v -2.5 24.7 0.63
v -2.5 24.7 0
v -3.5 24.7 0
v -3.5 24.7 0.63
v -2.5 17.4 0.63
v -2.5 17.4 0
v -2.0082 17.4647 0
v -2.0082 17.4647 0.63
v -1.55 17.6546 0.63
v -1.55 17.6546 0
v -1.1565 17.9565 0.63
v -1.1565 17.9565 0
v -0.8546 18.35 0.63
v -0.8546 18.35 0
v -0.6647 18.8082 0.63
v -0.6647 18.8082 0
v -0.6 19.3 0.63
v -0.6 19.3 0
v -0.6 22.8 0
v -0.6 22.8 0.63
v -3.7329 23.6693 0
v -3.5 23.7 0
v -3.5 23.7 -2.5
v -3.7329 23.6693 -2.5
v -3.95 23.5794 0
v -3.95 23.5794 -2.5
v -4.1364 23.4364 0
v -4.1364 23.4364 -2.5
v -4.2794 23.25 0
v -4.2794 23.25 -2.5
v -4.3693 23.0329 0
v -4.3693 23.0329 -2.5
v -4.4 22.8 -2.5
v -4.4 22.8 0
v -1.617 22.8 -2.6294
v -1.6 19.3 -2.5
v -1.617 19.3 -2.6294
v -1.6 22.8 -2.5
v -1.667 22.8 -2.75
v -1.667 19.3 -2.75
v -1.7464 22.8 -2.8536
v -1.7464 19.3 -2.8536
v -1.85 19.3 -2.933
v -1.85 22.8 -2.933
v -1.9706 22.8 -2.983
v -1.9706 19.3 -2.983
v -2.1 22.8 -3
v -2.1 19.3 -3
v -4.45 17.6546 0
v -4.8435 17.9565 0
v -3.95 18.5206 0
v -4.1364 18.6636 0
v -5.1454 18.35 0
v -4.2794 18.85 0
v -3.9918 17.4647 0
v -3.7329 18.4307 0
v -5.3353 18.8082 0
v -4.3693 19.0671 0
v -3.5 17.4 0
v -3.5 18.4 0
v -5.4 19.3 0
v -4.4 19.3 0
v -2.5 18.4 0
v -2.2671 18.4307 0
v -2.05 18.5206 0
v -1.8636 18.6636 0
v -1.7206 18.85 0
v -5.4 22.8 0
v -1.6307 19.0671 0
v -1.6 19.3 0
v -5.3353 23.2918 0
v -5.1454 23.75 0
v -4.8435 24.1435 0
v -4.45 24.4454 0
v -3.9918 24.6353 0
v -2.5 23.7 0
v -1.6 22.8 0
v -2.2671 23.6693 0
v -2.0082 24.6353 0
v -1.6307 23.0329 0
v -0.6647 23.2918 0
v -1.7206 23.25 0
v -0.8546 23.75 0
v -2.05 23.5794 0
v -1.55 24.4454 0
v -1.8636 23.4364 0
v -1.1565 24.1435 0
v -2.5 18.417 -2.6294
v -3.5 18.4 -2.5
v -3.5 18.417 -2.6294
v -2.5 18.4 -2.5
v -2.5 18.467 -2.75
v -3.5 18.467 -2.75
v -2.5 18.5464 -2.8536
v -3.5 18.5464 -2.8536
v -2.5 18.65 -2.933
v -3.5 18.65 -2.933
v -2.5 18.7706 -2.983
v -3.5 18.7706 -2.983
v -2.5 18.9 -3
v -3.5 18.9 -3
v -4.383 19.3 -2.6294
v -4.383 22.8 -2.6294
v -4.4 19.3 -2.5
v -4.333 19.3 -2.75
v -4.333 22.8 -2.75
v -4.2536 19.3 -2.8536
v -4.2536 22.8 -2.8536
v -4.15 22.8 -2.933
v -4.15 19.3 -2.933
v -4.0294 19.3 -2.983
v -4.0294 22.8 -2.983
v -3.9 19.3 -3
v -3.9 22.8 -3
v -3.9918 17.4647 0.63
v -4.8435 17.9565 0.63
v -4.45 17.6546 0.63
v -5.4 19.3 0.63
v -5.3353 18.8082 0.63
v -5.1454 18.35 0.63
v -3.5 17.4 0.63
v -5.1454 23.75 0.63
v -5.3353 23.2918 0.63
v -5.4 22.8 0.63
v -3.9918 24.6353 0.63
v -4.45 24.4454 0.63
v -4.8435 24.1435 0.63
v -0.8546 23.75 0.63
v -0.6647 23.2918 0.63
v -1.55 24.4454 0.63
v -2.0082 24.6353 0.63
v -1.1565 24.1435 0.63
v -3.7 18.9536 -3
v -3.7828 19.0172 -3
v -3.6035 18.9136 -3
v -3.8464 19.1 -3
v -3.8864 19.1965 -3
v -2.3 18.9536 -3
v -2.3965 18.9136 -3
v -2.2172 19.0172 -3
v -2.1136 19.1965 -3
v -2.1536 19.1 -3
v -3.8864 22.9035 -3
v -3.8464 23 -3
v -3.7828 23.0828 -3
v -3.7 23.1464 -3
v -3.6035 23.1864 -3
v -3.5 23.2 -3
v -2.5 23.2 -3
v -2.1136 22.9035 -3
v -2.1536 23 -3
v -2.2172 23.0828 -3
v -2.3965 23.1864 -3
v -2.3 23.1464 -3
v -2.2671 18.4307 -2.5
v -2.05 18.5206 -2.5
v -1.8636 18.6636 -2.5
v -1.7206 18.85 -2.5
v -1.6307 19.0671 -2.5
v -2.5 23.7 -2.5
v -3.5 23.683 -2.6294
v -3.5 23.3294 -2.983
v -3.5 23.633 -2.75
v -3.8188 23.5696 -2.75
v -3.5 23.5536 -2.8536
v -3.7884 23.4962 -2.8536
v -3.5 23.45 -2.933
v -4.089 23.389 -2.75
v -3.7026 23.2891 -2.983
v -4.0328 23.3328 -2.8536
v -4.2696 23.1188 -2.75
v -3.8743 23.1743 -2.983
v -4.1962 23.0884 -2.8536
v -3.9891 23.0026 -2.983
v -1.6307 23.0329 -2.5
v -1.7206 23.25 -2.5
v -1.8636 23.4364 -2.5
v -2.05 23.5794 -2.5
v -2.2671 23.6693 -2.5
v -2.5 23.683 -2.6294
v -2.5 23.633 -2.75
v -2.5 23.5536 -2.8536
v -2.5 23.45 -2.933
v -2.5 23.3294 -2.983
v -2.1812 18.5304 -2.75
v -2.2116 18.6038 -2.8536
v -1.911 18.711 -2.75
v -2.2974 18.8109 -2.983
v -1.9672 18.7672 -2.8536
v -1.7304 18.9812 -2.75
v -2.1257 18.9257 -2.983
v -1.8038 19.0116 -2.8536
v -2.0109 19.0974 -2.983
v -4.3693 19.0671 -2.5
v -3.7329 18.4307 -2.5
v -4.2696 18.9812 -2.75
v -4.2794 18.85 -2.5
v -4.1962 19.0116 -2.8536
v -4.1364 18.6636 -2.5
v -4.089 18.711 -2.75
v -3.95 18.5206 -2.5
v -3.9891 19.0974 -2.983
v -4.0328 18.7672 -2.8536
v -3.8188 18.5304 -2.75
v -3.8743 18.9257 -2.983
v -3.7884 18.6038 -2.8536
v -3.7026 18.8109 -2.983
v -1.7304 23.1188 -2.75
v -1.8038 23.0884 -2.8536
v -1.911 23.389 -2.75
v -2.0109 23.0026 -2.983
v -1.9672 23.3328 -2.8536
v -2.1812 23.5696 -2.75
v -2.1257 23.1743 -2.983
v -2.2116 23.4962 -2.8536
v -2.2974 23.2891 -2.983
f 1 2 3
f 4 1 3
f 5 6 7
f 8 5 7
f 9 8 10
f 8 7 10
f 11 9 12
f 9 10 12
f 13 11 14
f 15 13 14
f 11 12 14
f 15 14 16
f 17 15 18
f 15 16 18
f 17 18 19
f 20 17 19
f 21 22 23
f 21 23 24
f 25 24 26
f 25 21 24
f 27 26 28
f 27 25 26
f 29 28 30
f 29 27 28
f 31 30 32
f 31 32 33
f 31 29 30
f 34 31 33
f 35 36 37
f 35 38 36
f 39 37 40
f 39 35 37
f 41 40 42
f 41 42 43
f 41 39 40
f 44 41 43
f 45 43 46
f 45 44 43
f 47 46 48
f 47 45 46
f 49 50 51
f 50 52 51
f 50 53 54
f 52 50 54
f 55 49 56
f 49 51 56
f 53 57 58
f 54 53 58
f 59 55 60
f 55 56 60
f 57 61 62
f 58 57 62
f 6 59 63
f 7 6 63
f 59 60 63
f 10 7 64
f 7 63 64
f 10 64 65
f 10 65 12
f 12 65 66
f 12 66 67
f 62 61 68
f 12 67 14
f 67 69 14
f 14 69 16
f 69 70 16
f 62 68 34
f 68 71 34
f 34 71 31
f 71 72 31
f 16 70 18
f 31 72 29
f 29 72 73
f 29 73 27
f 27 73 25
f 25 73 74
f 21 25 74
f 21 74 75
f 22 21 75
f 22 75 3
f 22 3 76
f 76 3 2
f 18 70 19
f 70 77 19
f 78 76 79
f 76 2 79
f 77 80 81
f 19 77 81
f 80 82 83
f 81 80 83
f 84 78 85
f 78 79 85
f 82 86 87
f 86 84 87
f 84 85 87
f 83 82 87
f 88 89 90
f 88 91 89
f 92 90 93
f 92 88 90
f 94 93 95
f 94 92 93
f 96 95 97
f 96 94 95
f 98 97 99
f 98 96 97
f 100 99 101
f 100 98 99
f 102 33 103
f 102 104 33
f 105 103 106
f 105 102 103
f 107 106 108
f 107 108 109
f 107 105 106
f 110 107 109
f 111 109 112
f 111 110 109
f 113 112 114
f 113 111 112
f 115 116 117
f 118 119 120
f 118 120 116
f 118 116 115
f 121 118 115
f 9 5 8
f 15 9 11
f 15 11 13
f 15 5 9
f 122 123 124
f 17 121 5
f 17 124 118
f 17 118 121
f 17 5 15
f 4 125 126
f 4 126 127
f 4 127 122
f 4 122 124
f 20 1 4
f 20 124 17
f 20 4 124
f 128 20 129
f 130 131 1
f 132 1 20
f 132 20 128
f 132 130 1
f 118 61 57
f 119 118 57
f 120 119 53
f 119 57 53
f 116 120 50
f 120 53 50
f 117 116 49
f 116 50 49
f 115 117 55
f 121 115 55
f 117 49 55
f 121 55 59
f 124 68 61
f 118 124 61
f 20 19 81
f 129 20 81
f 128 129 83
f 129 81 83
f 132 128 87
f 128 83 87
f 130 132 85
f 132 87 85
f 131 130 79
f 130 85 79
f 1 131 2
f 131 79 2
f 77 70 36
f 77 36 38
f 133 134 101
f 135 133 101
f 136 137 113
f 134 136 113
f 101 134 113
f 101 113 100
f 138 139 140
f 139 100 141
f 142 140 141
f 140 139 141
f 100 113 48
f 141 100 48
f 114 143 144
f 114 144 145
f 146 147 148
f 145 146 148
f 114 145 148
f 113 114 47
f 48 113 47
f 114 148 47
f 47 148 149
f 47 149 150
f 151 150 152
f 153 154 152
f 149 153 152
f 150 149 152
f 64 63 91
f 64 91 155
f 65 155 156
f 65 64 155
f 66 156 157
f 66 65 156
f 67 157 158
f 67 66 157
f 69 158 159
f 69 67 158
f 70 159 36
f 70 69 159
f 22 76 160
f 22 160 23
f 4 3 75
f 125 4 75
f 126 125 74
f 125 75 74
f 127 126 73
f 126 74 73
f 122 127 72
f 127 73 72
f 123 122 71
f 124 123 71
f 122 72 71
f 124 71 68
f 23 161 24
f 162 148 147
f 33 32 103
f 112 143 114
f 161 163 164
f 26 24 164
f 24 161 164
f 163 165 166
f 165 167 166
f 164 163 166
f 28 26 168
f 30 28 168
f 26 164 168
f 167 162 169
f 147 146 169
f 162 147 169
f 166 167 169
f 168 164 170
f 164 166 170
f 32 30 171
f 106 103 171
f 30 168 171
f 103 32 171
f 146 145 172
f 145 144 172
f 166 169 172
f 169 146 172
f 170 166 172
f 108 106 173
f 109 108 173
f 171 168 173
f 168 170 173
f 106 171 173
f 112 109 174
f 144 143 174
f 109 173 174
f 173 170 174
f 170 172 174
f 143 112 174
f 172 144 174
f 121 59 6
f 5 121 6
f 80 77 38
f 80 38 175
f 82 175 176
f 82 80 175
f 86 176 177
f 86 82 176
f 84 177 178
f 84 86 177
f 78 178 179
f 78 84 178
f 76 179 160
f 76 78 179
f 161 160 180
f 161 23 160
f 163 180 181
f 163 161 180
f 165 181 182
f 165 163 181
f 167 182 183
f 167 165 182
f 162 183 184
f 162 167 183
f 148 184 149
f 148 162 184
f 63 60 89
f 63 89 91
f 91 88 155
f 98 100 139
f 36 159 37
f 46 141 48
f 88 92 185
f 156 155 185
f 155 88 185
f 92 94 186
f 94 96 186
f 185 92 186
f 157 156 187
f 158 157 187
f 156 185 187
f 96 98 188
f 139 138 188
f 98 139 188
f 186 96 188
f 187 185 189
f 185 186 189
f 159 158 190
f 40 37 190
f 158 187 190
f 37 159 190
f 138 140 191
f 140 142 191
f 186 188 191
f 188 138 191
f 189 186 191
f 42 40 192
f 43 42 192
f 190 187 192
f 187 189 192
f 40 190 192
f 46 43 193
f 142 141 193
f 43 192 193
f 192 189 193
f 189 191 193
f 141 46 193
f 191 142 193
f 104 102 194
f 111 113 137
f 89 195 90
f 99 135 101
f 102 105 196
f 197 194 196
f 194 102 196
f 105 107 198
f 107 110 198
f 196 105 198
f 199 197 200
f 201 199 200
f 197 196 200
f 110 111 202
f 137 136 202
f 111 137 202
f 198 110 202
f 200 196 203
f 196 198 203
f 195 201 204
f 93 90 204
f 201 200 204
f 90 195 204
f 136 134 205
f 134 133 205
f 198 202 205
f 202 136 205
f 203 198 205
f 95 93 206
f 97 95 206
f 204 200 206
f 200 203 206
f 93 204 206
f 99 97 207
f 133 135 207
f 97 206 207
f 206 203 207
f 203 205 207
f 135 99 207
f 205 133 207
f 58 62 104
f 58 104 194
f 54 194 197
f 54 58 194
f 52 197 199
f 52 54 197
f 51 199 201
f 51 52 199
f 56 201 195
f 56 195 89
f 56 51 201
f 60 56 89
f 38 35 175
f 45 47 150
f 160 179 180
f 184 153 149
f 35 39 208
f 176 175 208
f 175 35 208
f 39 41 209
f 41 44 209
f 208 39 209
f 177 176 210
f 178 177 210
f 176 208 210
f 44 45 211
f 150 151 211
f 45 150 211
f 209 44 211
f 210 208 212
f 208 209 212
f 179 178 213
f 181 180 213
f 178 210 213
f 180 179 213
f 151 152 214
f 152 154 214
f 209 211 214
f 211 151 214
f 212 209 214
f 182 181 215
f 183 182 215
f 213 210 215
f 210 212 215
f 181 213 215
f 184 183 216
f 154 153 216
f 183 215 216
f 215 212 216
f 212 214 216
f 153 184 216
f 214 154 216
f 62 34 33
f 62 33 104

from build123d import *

# Parameters (mm, degrees)
BOSS_EXTRUDE1_DEPTH = 3
BOSS_EXTRUDE2_DEPTH = 0.63
FILLET1_R           = 0.5


with BuildPart() as part:
    # Sketch1 → Boss-Extrude1 (new body)
    with BuildSketch(Plane.XY):
        with BuildLine():
            Line((-3.5, 18.4), (-2.5, 18.4))
            ThreePointArc((-2.5, 18.4), (-1.863603897, 18.663603897), (-1.6, 19.3))
            Line((-1.6, 19.3), (-1.6, 22.8))
            ThreePointArc((-1.6, 22.8), (-1.863603897, 23.436396103), (-2.5, 23.7))
            Line((-2.5, 23.7), (-3.5, 23.7))
            ThreePointArc((-3.5, 23.7), (-4.136396103, 23.436396103), (-4.4, 22.8))
            Line((-4.4, 22.8), (-4.4, 19.3))
            ThreePointArc((-4.4, 19.3), (-4.136396103, 18.663603897), (-3.5, 18.4))
        make_face()
    extrude(amount=-BOSS_EXTRUDE1_DEPTH)

    # Sketch2 → Boss-Extrude2 (add)
    with BuildSketch(Plane.XY):
        with BuildLine():
            Line((-3.5, 17.4), (-2.5, 17.4))
            ThreePointArc((-2.5, 17.4), (-1.156497116, 17.956497116), (-0.6, 19.3))
            Line((-0.6, 19.3), (-0.6, 22.8))
            ThreePointArc((-0.6, 22.8), (-1.156497116, 24.143502884), (-2.5, 24.7))
            Line((-2.5, 24.7), (-3.5, 24.7))
            ThreePointArc((-3.5, 24.7), (-4.843502884, 24.143502884), (-5.4, 22.8))
            Line((-5.4, 22.8), (-5.4, 19.3))
            ThreePointArc((-5.4, 19.3), (-4.843502884, 17.956497116), (-3.5, 17.4))
        make_face()
    extrude(amount=BOSS_EXTRUDE2_DEPTH)

    # Fillet1
    fillet1_edges = [part.edges().sort_by_distance(p)[0] for p in [
        (-3, 18.4, -3),
        (-1.863603897, 18.663603897, -3),
        (-1.6, 21.05, -3),
        (-1.863603897, 23.436396103, -3),
        (-3, 23.7, -3),
        (-4.136396103, 23.436396103, -3),
        (-4.4, 21.05, -3),
        (-4.136396103, 18.663603897, -3),
    ]]
    fillet(fillet1_edges, radius=FILLET1_R)


solid = part.part
